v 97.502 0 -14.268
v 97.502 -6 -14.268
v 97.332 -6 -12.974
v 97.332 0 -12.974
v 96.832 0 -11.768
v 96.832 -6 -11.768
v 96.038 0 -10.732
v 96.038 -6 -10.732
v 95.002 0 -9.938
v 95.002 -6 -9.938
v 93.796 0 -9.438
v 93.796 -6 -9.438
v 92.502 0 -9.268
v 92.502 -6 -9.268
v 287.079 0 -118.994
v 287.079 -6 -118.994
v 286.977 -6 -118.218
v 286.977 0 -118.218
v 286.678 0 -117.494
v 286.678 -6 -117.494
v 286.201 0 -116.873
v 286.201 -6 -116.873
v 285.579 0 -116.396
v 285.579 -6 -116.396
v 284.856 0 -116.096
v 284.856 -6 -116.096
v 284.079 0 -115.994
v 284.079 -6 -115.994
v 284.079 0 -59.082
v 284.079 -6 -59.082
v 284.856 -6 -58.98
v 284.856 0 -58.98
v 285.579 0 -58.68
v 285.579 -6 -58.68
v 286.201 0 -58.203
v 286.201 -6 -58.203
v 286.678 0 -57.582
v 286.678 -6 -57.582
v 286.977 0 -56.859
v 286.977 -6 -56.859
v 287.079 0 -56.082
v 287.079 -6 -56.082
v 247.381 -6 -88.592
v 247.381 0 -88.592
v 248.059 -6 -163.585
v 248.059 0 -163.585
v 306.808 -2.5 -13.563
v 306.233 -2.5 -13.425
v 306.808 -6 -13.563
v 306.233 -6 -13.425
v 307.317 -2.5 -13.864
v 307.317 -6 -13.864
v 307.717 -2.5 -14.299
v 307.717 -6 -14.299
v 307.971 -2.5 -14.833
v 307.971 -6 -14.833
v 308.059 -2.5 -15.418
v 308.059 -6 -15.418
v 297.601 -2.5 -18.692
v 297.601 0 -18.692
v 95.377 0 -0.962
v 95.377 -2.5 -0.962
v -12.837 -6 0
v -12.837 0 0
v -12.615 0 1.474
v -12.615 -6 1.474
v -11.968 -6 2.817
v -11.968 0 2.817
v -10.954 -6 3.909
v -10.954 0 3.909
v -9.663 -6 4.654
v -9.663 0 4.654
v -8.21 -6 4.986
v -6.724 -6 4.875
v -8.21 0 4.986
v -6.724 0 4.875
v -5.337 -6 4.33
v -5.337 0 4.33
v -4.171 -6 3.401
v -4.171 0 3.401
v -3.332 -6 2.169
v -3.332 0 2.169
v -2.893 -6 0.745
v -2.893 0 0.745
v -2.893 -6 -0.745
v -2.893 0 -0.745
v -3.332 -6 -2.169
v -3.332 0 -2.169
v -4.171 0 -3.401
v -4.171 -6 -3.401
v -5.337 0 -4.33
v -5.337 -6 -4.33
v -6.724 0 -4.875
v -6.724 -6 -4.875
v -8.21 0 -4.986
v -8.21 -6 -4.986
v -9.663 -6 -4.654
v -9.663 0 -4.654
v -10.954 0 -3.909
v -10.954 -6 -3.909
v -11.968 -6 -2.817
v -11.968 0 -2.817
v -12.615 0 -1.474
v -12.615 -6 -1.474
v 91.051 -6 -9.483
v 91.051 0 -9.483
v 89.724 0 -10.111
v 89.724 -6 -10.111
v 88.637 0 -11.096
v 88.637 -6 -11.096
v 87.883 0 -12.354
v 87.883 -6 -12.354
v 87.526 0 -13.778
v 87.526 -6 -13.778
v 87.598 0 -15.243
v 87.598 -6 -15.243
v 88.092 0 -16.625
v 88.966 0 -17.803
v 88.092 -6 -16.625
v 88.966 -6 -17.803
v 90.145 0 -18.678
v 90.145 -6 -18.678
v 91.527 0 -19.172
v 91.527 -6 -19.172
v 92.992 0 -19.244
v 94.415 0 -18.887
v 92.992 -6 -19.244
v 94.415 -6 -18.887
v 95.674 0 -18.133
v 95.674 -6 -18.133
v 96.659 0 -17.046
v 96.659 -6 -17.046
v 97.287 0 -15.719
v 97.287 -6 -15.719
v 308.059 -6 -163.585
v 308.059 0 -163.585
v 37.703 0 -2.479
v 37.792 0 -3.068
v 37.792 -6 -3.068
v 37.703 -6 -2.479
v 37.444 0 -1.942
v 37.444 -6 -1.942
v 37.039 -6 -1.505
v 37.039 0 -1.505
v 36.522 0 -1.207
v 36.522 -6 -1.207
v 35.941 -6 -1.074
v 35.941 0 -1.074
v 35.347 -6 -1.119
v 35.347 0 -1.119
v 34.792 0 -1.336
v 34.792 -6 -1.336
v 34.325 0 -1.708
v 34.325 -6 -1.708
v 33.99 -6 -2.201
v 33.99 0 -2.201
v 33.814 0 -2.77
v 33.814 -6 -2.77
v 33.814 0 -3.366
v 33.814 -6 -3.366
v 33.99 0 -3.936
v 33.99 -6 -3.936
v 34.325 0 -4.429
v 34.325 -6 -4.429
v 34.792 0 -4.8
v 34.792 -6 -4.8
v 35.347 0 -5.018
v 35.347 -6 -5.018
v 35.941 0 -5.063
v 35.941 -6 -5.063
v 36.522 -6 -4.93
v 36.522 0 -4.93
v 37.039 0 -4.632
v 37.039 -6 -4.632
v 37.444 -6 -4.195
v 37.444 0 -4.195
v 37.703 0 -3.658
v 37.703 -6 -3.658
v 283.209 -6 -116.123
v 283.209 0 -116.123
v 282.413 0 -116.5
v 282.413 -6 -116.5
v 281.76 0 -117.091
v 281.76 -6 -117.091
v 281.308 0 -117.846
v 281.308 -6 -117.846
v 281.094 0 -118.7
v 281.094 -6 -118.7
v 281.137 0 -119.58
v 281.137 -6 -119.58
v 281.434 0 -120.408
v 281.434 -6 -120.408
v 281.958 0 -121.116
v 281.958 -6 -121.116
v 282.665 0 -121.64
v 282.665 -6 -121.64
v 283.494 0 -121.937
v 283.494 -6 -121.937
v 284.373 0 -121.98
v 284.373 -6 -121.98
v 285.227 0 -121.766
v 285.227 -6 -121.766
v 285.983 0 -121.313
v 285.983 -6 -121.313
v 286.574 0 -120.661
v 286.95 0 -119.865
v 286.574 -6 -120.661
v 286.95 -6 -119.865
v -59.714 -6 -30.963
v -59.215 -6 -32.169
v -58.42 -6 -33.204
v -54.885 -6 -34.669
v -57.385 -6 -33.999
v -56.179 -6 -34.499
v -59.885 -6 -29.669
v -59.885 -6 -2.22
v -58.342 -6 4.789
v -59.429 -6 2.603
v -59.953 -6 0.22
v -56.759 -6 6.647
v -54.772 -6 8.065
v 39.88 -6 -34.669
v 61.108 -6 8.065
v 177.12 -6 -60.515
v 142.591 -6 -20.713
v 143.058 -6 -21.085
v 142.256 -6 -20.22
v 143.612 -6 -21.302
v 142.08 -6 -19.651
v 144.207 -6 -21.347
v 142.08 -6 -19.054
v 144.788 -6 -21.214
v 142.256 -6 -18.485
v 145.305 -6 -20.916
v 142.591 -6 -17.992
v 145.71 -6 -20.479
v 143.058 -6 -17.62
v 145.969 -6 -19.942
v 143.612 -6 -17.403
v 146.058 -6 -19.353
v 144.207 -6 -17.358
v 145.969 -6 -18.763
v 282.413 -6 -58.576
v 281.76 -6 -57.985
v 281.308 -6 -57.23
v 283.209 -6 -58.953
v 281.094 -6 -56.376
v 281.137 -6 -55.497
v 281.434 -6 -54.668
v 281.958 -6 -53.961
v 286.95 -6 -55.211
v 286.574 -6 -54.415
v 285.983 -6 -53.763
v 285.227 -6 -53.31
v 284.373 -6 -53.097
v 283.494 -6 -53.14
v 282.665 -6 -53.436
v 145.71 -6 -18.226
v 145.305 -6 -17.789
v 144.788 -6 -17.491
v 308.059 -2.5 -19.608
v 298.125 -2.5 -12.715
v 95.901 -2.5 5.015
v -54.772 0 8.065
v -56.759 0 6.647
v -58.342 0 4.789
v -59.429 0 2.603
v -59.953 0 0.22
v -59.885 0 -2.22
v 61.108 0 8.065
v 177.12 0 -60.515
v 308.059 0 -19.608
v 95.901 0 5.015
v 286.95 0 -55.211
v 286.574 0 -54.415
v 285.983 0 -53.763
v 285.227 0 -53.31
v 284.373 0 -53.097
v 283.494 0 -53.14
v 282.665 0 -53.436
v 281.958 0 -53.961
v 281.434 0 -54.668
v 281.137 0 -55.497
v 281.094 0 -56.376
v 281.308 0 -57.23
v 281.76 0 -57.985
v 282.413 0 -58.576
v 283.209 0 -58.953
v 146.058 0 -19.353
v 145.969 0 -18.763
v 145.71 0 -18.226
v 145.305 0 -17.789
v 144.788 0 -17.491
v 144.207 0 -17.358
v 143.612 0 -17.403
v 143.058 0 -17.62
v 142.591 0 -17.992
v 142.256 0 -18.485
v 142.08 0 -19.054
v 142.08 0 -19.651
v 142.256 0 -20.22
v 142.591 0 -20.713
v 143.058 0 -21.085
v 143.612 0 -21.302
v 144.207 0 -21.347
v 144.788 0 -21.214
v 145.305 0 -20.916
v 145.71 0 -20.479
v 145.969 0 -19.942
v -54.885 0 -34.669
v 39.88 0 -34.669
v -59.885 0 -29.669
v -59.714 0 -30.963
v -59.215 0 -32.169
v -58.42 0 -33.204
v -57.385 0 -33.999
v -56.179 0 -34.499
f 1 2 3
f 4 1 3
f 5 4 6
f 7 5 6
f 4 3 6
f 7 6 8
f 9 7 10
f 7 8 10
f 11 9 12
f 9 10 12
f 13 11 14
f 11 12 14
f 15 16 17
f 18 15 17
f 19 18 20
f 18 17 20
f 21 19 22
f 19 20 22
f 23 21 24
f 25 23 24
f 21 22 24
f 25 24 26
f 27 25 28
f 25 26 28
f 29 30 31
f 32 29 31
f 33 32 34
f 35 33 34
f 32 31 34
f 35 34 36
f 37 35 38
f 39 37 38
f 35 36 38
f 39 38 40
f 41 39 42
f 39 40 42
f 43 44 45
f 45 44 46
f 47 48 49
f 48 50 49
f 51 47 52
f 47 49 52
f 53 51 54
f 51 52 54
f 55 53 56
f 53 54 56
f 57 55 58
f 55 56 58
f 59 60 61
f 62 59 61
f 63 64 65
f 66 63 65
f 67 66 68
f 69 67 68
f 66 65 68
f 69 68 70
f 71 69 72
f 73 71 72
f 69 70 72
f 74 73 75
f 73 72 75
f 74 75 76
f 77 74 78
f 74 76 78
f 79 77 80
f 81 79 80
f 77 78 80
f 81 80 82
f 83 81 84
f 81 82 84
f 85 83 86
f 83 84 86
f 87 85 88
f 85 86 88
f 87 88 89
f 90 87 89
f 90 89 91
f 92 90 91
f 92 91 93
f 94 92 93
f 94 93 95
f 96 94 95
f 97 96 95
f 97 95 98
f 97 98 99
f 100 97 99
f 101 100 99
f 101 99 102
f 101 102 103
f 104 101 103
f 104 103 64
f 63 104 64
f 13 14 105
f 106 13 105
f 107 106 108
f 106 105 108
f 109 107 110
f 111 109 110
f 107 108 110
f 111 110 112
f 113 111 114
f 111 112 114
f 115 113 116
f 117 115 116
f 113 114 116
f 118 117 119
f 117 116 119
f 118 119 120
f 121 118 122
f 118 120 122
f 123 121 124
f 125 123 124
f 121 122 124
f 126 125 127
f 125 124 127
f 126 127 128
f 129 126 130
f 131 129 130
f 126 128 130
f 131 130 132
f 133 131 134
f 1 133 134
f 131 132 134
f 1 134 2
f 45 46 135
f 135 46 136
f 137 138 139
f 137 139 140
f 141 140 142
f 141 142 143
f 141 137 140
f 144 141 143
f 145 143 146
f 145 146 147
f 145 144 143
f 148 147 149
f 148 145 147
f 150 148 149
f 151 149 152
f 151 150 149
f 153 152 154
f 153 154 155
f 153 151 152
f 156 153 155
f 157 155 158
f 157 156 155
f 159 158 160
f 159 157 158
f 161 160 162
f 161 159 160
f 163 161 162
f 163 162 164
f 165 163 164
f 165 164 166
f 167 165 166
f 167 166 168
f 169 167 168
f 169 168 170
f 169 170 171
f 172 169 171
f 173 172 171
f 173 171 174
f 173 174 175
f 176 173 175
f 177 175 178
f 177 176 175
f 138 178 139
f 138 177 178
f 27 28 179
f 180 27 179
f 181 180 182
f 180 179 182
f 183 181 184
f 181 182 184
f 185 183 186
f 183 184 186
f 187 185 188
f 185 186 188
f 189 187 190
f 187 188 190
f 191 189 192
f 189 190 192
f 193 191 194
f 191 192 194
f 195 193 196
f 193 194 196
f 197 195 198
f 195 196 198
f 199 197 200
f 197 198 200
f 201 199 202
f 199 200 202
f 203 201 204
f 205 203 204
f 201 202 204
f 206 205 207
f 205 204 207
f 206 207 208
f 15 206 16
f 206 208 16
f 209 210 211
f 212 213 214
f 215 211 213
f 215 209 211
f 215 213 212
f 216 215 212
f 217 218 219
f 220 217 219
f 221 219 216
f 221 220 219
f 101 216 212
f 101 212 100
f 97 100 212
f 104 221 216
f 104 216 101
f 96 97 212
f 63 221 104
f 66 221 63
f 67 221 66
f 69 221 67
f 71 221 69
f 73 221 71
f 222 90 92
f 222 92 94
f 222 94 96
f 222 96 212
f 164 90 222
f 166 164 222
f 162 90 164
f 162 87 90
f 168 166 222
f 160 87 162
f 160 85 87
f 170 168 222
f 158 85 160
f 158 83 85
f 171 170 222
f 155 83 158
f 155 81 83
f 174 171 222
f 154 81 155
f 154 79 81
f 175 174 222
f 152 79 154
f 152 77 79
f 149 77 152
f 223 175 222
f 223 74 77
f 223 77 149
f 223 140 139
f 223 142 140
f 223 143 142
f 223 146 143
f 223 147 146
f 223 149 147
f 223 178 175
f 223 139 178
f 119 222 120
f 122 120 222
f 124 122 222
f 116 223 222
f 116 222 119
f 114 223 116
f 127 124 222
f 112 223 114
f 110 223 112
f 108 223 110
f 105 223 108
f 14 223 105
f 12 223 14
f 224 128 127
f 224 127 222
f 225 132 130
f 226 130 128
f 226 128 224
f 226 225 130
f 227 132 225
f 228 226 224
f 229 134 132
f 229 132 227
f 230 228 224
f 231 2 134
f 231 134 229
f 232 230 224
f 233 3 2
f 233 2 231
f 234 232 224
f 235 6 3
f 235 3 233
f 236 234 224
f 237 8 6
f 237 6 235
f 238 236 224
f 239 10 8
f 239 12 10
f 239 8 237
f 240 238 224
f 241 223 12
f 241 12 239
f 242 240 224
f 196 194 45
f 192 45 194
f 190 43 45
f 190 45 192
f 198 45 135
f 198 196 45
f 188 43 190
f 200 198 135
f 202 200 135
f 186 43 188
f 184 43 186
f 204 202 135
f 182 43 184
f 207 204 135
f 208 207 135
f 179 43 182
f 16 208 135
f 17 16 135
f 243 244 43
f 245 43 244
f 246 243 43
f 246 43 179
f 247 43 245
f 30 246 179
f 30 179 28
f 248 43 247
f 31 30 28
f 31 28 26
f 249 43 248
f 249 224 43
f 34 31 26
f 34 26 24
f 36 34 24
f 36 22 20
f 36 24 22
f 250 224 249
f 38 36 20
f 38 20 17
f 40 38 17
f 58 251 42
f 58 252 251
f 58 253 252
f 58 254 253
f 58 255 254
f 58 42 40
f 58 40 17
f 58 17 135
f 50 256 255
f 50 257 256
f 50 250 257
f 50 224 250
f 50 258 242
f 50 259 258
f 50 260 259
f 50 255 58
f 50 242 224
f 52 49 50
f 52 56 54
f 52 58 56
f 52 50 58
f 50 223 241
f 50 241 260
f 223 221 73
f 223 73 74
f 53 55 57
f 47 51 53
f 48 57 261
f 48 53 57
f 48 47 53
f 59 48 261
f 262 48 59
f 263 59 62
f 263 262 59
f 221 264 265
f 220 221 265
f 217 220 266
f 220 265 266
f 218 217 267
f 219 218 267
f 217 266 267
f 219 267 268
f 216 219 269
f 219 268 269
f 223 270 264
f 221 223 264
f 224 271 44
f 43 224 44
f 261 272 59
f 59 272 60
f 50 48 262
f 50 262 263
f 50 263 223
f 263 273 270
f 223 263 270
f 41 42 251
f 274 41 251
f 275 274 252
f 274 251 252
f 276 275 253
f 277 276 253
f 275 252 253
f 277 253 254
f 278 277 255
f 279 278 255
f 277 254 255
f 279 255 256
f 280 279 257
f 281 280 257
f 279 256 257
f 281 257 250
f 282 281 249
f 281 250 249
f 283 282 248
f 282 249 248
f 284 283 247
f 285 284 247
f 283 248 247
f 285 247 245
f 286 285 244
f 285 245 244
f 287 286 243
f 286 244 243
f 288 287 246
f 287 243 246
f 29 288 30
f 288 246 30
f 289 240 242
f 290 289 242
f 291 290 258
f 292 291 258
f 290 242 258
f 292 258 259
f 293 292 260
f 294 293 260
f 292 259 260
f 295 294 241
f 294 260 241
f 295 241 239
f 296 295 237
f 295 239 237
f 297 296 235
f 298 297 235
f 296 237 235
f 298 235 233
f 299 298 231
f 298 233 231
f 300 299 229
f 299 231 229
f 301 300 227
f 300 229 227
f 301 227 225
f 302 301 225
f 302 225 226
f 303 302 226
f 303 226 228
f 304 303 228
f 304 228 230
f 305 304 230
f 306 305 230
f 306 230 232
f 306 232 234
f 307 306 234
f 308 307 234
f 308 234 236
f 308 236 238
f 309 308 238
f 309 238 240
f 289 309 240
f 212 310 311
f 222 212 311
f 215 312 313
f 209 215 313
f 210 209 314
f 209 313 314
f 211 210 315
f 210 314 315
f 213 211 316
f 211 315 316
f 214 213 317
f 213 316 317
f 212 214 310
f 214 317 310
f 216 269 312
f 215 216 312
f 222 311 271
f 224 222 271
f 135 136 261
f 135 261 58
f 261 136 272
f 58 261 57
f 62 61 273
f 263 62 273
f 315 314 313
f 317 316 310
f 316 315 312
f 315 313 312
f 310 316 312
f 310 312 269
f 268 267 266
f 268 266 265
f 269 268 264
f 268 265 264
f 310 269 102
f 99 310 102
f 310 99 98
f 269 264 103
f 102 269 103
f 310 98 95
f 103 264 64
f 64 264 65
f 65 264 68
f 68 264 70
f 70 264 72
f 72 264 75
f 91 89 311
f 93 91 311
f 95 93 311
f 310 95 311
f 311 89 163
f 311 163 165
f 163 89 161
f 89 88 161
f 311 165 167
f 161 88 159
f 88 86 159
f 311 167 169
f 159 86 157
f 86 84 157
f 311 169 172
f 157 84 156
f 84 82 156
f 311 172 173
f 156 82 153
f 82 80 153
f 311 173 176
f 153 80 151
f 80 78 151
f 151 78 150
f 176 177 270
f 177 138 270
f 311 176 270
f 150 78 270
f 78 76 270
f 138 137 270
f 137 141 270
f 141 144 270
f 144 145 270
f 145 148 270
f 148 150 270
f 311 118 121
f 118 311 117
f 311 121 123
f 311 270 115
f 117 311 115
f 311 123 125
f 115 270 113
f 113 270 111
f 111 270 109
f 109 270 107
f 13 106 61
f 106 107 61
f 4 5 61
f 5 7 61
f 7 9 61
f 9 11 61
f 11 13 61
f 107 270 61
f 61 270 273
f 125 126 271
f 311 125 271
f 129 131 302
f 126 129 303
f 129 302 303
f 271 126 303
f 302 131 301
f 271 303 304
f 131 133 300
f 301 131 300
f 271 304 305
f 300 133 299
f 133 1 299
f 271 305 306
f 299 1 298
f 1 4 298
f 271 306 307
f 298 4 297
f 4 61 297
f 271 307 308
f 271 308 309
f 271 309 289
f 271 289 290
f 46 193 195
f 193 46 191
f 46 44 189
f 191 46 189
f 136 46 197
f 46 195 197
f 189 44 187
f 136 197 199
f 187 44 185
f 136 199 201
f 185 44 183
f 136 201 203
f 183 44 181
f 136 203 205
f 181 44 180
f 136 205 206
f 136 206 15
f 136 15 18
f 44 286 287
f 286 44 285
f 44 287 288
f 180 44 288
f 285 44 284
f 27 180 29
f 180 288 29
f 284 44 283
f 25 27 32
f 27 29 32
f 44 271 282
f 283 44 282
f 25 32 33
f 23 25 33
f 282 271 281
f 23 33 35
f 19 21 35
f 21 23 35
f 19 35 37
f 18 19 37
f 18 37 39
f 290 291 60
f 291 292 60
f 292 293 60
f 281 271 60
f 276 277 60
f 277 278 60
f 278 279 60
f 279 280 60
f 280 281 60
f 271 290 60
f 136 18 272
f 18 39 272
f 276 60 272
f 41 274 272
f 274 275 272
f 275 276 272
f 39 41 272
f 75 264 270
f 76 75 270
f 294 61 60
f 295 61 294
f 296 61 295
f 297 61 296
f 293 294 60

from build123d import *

# Parameters (mm, degrees)
F0_R      = 2
F1_DEPTH  = 6
F3_DEPTH  = 6.001
F5_DEPTH  = 6.001
F6_R      = 5
F7_DEPTH  = 6.001
F8_DEPTH  = 585
F9_R      = 2
F10_DEPTH = 6.001
F12_DEPTH = 2.5
F13_R     = 2


# Not quite as in the source:
# - an extrude ends at something that could not be found from the text; its depth is read off the source's solid


with BuildPart() as f1:
    # F0 (on Front) → F1 (new body)
    with BuildSketch(Plane.XZ):
        with BuildLine():
            Line((61.1081310213, 8.0650188029), (-54.7722764313, 8.0650188029))
            ThreePointArc((-54.7722764313, 8.0650188029), (-58.9525619371, 3.7295520634), (-59.8848706484, -2.2203940898))
            Line((-59.8848706484, -2.2203940898), (-59.8848706484, -29.6689261496))
            ThreePointArc((-59.8848706484, -29.6689261496), (-58.4204045543, -33.2044600555), (-54.8848706484, -34.6689261496))
            Line((-54.8848706484, -34.6689261496), (-38.6363018323, -34.6689261496))
            Line((-38.6363018323, -34.6689261496), (39.8797094822, -34.6689261496))
            Line((39.8797094822, -34.6689261496), (177.1196573973, -60.5151057243))
            Line((177.1196573973, -60.5151057243), (247.381187493, -88.5924363301))
            Line((247.381187493, -88.5924363301), (248.0585300922, -163.5853774846))
            Line((248.0585300922, -163.5853774846), (308.0585300922, -163.5853774846))
            Line((308.0585300922, -163.5853774846), (308.0585300922, -13.5853774846))
            Line((308.0585300922, -13.5853774846), (61.1081310213, 8.0650188029))
        make_face()
        with Locations((35.7915443742, -3.0683759738)):
            Circle(F0_R, mode=Mode.SUBTRACT)
    extrude(amount=F1_DEPTH)

    # F2 (on face) → F3 (cut, through all)
    with BuildSketch(Plane.XZ.offset(6)):
        with BuildLine():
            ThreePointArc((92.5020176823, -9.2679053605), (88.9664837764, -17.8034392664), (97.5020176823, -14.2679053605))
            ThreePointArc((97.5020176823, -14.2679053605), (96.0375515883, -10.7323714546), (92.5020176823, -9.2679053605))
        make_face()
    extrude(amount=-F3_DEPTH, mode=Mode.SUBTRACT)

    # F4 (on face) → F5 (cut, through all)
    with BuildSketch(Plane.XZ.offset(6)):
        with BuildLine():
            ThreePointArc((284.0794362254, -115.9942394993), (281.9581158818, -121.1155598429), (287.0794362254, -118.9942394993))
            ThreePointArc((287.0794362254, -118.9942394993), (286.2007565689, -116.8729191558), (284.0794362254, -115.9942394993))
        make_face()
        with BuildLine():
            ThreePointArc((287.0794362254, -56.0820794532), (281.9581158818, -53.9607591097), (284.0794362254, -59.0820794532))
            ThreePointArc((284.0794362254, -59.0820794532), (286.2007565689, -58.2033997968), (287.0794362254, -56.0820794532))
        make_face()
    extrude(amount=-F5_DEPTH, mode=Mode.SUBTRACT)

    # F6 (on face) → F7 (cut, through all)
    with BuildSketch(Plane(origin=(0, 0, 0), x_dir=(-1, 0, 0), z_dir=(0, 1, 0))):
        with Locations((7.8367077125, 0)):
            Circle(F6_R)
    extrude(amount=-F7_DEPTH, mode=Mode.SUBTRACT)

    # F0 (on Front) → F8 (cut, through all)
    with BuildSketch(Plane.XZ):
        with BuildLine():
            Line((61.1081310213, 8.0650188029), (-54.7722764313, 8.0650188029))
            ThreePointArc((-54.7722764313, 8.0650188029), (-58.9525619371, 3.7295520634), (-59.8848706484, -2.2203940898))
            Line((-59.8848706484, -2.2203940898), (-59.8848706484, -29.6689261496))
            ThreePointArc((-59.8848706484, -29.6689261496), (-58.4204045543, -33.2044600555), (-54.8848706484, -34.6689261496))
            Line((-54.8848706484, -34.6689261496), (-38.6363018323, -34.6689261496))
            Line((-38.6363018323, -34.6689261496), (39.8797094822, -34.6689261496))
            Line((39.8797094822, -34.6689261496), (177.1196573973, -60.5151057243))
            Line((177.1196573973, -60.5151057243), (247.381187493, -88.5924363301))
            Line((247.381187493, -88.5924363301), (248.0585300922, -163.5853774846))
            Line((248.0585300922, -163.5853774846), (308.0585300922, -163.5853774846))
            Line((308.0585300922, -163.5853774846), (308.0585300922, -13.5853774846))
            Line((308.0585300922, -13.5853774846), (61.1081310213, 8.0650188029))
        make_face()
        with Locations((35.7915443742, -3.0683759738)):
            Circle(F0_R, mode=Mode.SUBTRACT)
    extrude(amount=-F8_DEPTH, mode=Mode.SUBTRACT)

    # F9 (on face) → F10 (cut, through all)
    with BuildSketch(Plane.XZ.offset(6)):
        with Locations((144.0575271969, -19.352506299)):
            Circle(F9_R)
    extrude(amount=-F10_DEPTH, mode=Mode.SUBTRACT)

    # F11 (on face) → F12 (cut)
    with BuildSketch(Plane(origin=(0, 0, 0), x_dir=(-1, 0, 0), z_dir=(0, 1, 0))):
        Polygon((-95.3768665934, -0.9623710934), (-95.9008827898, 5.0147023565), (-298.1252011792, -12.7145122896), (-308.0585300922, -13.5853774846), (-308.0585300922, -19.6083919751), (-297.6011849827, -18.6915857396), align=None)
    extrude(amount=-F12_DEPTH, mode=Mode.SUBTRACT)

    # F13
    f13_edges = [f1.edges().sort_by_distance(p)[0] for p in [
        (308.05853, -4.25, -13.585377),
    ]]
    fillet(f13_edges, radius=F13_R)


solid = f1.part
